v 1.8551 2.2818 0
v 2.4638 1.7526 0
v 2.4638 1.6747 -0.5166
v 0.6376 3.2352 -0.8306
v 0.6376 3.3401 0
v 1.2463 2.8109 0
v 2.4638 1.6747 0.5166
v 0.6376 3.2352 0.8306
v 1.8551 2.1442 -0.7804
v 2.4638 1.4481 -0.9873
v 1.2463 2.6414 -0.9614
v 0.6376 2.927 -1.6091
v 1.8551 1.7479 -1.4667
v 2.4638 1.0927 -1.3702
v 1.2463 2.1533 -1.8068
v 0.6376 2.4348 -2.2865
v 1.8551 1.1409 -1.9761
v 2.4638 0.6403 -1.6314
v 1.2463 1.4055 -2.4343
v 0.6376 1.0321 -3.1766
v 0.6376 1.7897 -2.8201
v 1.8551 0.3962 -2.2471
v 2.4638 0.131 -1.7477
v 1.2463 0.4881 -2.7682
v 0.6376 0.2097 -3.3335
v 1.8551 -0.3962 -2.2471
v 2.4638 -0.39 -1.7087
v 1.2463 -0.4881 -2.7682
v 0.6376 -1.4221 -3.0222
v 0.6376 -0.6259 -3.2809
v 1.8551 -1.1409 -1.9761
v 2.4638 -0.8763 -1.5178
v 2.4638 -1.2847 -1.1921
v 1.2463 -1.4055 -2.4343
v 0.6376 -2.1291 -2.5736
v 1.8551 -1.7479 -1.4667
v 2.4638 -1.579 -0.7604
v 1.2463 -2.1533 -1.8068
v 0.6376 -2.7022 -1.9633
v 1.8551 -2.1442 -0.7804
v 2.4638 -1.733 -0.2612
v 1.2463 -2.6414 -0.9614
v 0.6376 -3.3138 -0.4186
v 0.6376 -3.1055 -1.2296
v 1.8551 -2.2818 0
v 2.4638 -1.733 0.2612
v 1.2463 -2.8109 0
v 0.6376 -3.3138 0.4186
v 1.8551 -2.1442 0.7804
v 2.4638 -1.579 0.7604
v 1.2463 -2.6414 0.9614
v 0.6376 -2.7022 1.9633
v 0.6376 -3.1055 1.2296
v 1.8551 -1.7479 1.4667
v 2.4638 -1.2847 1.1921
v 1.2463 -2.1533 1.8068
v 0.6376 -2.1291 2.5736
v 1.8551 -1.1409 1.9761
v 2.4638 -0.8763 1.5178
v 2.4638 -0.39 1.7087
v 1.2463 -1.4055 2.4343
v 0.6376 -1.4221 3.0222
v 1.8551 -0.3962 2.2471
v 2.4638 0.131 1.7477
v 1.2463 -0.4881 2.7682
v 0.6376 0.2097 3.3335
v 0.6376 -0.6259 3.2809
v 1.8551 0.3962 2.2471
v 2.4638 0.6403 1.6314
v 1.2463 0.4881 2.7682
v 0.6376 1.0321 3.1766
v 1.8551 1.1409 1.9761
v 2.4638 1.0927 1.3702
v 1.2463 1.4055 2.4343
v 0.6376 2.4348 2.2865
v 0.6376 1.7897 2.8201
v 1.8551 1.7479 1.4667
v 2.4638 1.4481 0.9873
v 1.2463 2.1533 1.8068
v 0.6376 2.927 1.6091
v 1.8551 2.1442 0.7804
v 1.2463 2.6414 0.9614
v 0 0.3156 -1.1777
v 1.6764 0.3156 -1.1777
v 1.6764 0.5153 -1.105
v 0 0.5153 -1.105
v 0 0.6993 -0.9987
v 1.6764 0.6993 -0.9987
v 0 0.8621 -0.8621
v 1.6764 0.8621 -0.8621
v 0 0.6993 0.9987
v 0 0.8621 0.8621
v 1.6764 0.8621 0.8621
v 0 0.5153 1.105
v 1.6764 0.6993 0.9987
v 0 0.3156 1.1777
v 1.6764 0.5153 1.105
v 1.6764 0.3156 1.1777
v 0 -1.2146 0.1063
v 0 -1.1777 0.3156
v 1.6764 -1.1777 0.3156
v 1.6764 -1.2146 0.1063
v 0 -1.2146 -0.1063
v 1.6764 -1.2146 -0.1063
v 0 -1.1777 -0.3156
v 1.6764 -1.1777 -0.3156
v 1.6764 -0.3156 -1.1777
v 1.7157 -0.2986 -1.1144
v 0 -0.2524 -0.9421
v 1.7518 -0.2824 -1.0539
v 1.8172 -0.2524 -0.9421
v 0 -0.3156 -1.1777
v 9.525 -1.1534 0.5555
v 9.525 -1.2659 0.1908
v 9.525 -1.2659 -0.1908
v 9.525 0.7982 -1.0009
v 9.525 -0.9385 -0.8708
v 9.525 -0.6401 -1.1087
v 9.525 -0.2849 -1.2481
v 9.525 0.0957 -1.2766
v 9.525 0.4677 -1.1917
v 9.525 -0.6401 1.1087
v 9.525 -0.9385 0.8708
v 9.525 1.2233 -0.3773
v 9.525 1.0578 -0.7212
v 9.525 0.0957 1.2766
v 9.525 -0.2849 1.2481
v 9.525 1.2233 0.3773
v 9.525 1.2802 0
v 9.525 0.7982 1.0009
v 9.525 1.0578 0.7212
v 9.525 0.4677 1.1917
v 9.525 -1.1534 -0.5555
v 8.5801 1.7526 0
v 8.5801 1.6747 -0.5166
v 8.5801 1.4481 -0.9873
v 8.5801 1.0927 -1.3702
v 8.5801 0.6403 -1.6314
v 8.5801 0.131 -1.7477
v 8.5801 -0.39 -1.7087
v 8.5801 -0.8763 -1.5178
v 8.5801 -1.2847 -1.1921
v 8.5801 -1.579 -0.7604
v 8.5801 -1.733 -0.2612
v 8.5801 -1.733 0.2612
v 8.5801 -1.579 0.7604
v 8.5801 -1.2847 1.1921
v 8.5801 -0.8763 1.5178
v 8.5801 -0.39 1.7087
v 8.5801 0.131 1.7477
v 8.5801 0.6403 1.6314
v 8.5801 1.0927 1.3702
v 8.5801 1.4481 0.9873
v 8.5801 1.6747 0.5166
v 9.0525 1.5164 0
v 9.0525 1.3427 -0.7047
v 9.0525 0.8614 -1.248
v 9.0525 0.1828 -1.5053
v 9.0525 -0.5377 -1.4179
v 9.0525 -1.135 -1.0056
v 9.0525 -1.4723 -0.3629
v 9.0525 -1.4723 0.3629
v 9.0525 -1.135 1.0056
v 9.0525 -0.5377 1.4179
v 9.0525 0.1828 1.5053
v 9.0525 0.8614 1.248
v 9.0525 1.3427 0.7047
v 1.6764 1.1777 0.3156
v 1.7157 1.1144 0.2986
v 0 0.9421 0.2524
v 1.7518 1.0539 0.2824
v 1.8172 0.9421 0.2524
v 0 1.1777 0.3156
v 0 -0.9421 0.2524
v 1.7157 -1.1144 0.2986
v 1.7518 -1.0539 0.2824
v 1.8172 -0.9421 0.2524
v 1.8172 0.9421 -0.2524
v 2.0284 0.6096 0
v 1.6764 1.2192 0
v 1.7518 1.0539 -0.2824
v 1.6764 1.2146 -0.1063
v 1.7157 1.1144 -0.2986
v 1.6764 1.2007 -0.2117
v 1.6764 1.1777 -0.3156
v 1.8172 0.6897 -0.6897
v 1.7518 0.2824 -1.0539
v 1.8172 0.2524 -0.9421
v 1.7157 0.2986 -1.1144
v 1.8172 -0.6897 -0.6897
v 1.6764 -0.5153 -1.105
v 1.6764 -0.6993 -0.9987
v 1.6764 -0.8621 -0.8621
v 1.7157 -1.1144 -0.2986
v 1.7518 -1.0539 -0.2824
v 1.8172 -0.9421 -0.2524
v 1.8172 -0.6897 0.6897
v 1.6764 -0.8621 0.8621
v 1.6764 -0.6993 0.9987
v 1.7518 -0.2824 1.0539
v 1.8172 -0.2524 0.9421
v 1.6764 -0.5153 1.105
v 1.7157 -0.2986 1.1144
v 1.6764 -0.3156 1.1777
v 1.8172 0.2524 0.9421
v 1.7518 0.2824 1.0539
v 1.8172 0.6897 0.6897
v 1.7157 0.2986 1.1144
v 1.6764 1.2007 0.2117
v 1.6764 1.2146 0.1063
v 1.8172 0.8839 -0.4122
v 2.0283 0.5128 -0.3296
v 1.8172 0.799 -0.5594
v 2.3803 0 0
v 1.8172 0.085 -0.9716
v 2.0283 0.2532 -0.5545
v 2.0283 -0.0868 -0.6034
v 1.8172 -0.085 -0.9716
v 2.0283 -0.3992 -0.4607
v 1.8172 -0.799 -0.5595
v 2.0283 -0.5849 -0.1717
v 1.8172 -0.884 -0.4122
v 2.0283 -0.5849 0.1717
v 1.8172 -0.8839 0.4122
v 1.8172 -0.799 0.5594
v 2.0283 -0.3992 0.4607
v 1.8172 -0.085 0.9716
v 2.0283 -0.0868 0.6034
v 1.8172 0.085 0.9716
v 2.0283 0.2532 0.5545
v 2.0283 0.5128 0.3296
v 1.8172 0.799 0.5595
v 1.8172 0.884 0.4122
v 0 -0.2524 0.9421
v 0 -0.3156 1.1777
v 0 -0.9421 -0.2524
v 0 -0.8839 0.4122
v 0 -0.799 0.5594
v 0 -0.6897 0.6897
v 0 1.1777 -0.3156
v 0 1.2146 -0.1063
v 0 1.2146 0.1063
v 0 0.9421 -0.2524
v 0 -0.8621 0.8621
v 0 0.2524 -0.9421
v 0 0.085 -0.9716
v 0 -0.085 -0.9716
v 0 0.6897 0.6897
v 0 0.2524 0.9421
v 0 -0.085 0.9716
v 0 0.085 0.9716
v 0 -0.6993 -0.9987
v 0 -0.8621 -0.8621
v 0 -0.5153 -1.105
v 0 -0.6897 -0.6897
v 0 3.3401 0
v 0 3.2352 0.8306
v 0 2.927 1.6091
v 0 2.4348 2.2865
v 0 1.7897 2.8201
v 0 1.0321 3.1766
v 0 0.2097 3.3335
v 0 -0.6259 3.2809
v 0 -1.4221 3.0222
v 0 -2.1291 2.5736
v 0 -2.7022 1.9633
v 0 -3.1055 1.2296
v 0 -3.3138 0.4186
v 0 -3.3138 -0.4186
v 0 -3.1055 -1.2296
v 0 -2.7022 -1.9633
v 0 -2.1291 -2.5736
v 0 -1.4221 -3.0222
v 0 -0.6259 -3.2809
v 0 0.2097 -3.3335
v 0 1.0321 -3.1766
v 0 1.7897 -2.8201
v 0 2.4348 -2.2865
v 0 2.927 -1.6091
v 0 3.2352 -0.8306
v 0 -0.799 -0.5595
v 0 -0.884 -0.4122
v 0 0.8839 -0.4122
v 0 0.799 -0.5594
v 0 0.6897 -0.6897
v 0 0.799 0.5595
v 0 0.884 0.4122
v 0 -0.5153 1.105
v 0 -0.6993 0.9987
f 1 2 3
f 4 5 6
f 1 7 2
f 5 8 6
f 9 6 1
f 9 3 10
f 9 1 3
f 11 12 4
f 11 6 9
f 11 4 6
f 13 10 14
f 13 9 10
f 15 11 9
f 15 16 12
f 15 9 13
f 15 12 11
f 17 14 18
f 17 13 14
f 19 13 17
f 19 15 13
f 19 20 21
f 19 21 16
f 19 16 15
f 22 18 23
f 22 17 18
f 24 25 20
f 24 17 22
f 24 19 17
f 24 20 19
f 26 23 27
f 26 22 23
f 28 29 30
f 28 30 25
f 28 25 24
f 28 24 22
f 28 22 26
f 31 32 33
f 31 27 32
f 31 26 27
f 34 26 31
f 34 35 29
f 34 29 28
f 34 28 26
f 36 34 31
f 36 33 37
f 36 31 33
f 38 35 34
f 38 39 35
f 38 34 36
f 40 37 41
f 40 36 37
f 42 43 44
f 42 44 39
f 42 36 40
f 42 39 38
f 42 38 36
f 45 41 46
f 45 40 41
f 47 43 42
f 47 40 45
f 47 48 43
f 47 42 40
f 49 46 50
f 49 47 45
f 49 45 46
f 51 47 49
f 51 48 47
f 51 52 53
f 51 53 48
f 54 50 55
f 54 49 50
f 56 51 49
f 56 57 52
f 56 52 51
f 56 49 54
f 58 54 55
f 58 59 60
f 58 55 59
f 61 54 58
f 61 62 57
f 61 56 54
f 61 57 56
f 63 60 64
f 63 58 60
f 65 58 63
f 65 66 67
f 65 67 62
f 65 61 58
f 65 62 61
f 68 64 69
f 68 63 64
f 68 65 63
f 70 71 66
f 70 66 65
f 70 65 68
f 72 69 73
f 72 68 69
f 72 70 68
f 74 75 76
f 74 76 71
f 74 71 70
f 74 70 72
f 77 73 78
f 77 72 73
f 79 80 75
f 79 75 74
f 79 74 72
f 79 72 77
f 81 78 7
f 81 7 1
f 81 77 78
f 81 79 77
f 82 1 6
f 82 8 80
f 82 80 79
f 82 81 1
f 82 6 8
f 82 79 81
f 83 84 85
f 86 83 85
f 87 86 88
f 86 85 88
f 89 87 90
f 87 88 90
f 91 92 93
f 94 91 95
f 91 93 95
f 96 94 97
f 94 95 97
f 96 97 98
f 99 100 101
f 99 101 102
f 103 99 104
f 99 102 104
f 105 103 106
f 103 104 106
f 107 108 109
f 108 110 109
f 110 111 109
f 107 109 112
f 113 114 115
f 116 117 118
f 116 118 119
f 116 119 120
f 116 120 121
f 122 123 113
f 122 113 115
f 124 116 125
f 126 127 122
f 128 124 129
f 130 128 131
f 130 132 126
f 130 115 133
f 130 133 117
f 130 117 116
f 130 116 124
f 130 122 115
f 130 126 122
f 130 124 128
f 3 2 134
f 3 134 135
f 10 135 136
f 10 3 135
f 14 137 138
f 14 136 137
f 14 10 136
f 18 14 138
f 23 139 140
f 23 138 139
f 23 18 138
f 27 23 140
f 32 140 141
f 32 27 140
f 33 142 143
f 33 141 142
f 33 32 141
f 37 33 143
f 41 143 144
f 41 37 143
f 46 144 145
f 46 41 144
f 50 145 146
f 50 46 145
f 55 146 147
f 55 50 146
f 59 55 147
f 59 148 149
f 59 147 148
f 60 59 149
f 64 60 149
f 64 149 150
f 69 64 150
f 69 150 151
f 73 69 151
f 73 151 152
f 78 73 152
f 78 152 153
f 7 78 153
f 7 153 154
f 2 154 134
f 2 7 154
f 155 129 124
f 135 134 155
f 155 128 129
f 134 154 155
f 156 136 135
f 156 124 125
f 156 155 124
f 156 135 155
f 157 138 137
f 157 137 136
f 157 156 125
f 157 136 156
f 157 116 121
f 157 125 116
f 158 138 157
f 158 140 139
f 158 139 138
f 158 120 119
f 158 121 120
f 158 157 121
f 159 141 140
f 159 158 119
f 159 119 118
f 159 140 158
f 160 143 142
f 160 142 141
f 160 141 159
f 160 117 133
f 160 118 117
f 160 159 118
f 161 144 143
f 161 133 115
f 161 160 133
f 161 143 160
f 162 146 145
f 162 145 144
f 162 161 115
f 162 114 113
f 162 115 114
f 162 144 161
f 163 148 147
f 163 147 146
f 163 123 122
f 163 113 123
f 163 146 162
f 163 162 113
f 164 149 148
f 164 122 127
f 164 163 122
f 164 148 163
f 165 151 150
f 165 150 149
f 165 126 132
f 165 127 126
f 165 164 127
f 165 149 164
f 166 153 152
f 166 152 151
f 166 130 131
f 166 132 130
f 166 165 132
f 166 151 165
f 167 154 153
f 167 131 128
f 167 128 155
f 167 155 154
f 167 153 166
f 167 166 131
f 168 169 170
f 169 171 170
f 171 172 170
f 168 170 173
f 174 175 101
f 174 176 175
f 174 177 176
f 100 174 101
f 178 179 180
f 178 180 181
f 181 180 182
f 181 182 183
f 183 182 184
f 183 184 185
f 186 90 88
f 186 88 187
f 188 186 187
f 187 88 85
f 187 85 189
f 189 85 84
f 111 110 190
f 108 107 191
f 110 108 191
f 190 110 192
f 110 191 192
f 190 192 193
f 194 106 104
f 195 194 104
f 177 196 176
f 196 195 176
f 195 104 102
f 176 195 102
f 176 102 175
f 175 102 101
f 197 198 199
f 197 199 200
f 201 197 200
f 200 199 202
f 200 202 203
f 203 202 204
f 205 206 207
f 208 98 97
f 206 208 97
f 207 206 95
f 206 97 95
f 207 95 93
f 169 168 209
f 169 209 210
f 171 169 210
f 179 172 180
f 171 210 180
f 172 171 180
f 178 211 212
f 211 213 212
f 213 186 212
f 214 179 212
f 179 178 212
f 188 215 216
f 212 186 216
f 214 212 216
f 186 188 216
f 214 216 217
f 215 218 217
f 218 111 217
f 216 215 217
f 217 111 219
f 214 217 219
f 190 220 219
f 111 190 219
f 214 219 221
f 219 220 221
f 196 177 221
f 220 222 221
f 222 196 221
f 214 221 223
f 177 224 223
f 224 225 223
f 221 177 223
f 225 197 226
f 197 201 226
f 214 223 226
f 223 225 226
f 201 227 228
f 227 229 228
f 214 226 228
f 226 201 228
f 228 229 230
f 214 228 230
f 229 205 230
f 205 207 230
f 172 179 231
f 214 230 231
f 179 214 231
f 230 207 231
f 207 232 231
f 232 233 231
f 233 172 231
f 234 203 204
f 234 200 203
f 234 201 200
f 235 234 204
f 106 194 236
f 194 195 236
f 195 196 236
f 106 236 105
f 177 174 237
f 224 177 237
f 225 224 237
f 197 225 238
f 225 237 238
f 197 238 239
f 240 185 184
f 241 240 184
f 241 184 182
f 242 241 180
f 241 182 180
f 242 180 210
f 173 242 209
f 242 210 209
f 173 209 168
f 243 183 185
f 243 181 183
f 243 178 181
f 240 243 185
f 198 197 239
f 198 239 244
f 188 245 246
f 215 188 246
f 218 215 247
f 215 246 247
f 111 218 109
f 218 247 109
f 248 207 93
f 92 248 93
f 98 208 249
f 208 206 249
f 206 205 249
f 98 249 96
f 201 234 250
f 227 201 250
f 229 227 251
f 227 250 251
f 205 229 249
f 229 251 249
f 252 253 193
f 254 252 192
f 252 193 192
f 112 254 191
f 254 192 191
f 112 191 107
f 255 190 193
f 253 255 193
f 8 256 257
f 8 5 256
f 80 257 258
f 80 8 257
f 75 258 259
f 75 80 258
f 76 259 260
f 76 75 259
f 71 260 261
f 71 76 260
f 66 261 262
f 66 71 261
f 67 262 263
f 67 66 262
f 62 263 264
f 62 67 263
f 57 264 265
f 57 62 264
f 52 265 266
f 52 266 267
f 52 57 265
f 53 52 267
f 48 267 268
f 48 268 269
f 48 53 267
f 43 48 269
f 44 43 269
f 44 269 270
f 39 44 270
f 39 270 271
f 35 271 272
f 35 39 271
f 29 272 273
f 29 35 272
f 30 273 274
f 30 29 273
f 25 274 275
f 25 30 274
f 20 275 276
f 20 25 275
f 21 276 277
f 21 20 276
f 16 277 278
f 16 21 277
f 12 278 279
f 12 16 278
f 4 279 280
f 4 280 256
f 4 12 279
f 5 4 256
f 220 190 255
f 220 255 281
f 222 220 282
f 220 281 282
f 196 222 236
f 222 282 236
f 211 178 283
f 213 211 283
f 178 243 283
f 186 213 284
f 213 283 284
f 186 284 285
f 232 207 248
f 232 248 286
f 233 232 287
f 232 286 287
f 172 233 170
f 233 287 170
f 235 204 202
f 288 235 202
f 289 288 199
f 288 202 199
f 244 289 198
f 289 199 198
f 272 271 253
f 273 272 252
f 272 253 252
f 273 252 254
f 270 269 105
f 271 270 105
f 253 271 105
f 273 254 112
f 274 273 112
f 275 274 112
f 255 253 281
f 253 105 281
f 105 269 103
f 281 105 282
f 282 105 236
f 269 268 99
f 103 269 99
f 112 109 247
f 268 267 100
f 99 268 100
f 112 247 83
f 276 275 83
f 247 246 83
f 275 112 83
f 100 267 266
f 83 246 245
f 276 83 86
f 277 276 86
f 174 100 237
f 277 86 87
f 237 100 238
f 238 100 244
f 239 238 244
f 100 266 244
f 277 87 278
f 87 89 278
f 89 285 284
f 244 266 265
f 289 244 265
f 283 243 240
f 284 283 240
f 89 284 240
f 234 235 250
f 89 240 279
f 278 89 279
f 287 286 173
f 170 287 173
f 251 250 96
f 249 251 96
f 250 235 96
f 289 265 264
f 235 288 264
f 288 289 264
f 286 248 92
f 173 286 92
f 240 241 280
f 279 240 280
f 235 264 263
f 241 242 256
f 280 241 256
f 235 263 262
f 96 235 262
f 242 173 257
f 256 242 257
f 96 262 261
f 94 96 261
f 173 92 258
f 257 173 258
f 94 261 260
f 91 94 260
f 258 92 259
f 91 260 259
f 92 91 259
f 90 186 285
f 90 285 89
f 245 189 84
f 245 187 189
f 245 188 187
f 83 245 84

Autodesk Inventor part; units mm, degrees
ref_plane "YZ Plane" through (0, 0, 0) normal (1, 0, 0) x (0, 1, 0)
ref_plane "XZ Plane" through (0, 0, 0) normal (0, 1, 0) x (-1, 0, 0)
sketch "Sketch1" plane through (0, 0, 0) normal (0, 0, 1) x (1, 0, 0)
  line L0 (9.525, 0) -> (9.525, 1.7526)
  line L1 (9.525, 1.7526) -> (2.4638, 1.7526)
  line L2 (0, 3.3401) -> (0, 1.2192)
  line L3 (0, 1.2192) -> (1.6764, 1.2192)
  line L4 (1.6764, 1.2192) -> (2.3803, 0)
  line L5 (2.3803, 0) -> (9.525, 0)
  line L6 (0, 3.3401) -> (0.6376, 3.3401)
  line L7 (0.6376, 3.3401) -> (2.4638, 1.7526)
  line L8 (-1.905, 0) -> (11.43, 0) projected
  line L9 (0, -0.668) -> (0, 4.0081) projected
  dimension "d0" = 9.525
  dimension "d1" = 1.6764
  dimension "d2" = 3.5052
  dimension "d3" = 2.4638
  dimension "d4" = 41
  dimension "d5" = 2.4384
  dimension "d6" = 60
  dimension "d7" = 6.6802
revolve "Body" add sketch "Sketch1" angle 360 about axis through (2.3803, 0, 0) along (1, 0, 0) contours L5 L4 L3 L2 L6 L7 L1 L0
sketch "Sketch2" plane through (0, 0, 0) normal (-1, 0, 0) x (0, 0, 1)
  circle A0 centre (0, 0) radius 3.3401 projected
  circle A1 centre (0, 0) radius 1.2192 projected
  line L0 (0.9421, 0.2524) -> (1.1777, 0.3156)
  line L1 (0.9421, -0.2524) -> (1.1777, -0.3156)
  arc A2 (0.9421, -0.2524) -> (0.9421, 0.2524) centre (0, 0) ccw
  arc A3 (1.1777, -0.3156) -> (1.1777, 0.3156) centre (0, 0) ccw
  line L2 (0, -4.6761) -> (0, 4.6761) projected
  line L3 (-4.6761, 0) -> (4.6761, 0) projected
  line L4 (0.9421, 0.2524) -> (0, 0) construction
  line L5 (0, 0) -> (0.9421, -0.2524) construction
  line L6 (0.2524, 0.9421) -> (0.3156, 1.1777)
  line L7 (0.6897, 0.6897) -> (0.8621, 0.8621)
  arc A4 (0.6897, 0.6897) -> (0.2524, 0.9421) centre (0, 0) ccw
  arc A5 (0.8621, 0.8621) -> (0.3156, 1.1777) centre (0, 0) ccw
  line L8 (-0.6897, 0.6897) -> (-0.8621, 0.8621)
  line L9 (-0.2524, 0.9421) -> (-0.3156, 1.1777)
  arc A6 (-0.2524, 0.9421) -> (-0.6897, 0.6897) centre (0, 0) ccw
  arc A7 (-0.3156, 1.1777) -> (-0.8621, 0.8621) centre (0, 0) ccw
  line L10 (-0.9421, -0.2524) -> (-1.1777, -0.3156)
  line L11 (-0.9421, 0.2524) -> (-1.1777, 0.3156)
  arc A8 (-0.9421, 0.2524) -> (-0.9421, -0.2524) centre (0, 0) ccw
  arc A9 (-1.1777, 0.3156) -> (-1.1777, -0.3156) centre (0, 0) ccw
  line L12 (-0.2524, -0.9421) -> (-0.3156, -1.1777)
  line L13 (-0.6897, -0.6897) -> (-0.8621, -0.8621)
  arc A10 (-0.6897, -0.6897) -> (-0.2524, -0.9421) centre (0, 0) ccw
  arc A11 (-0.8621, -0.8621) -> (-0.3156, -1.1777) centre (0, 0) ccw
  line L14 (0.6897, -0.6897) -> (0.8621, -0.8621)
  line L15 (0.2524, -0.9421) -> (0.3156, -1.1777)
  arc A12 (0.2524, -0.9421) -> (0.6897, -0.6897) centre (0, 0) ccw
  arc A13 (0.3156, -1.1777) -> (0.8621, -0.8621) centre (0, 0) ccw
  dimension "d8" = 1.9507
  dimension "d9" = 2.4384
  dimension "d10" = 15
  dimension "d11" = 15
  dimension "d22" = 360
extrude "Slot" add sketch "Sketch2" against normal up to next contours L3 A2 L0 A1 | A1 L1 A2 L3 | L3 A8 L10 A1 | A1 L11 A8 L3 | A1 L7 A4 L6 | L9 A6 L8 A1 | A1 L13 A10 L12 | L15 A12 L14 A1
thread "Thread" size "6-32 UNC" class "2A" standard "ANSI Unified Screw Threads" length 5.077
chamfer "Chamfer1" distance 0.4724 distance2 0.9449 1 edges at (9.525, -1.7526, 0) measured on face at (9.525, 0.5842, 0.7748)
ref_plane "Work Plane1" through (66.6877, 0, 0) normal (0, 0, -1) x (1, 0, 0)
equation "\"d0\" = NLG"
equation "\"d1\" = INTI"
equation "\"d2\" = GD"
equation "\"d3\" = KOH"
equation "\"d4\" = 0.5 * SEWI"
equation "\"d5\" = SW"
equation "\"d7\" = KOD"
equation "\"d8\" = 0.8 * SW"
equation "\"d9\" = SW"
equation "\"d15\" = GEL"
equation "\"d17\" = -0.5 * SPD + 0.5 * GD"
equation "\"d18\" = GUL"
equation "\"NLG\" = 9.525"
equation "\"SW\" = 2.4384"
equation "\"INTI\" = 1.6764"
equation "\"GEL\" = 5.07695"
equation "\"KOH\" = 2.4638"
equation "\"KOD\" = 6.6802"
equation "\"GUL\" = 0.94488"
equation "\"SPD\" = 2.56032"
equation "\"GD\" = NND"
equation "\"SEWI\" = 82deg"
equation "\"TOA\" = 30deg"
equation "\"GD1\" = SPD"
equation "\"EPV\" = 4.4794"
equation "\"THREADDIA\" = 3.5052"
equation "\"BDM\" = NND"
equation "\"NND\" = 3.5052"
equation "\"GAL\" = 1.9845"
equation "\"E0\" = 1.155 * SW"
properties part number "ANSI B18.3 - 6-32 UNC x 0.375, SSFCHCSI" material "Steel, Mild"
